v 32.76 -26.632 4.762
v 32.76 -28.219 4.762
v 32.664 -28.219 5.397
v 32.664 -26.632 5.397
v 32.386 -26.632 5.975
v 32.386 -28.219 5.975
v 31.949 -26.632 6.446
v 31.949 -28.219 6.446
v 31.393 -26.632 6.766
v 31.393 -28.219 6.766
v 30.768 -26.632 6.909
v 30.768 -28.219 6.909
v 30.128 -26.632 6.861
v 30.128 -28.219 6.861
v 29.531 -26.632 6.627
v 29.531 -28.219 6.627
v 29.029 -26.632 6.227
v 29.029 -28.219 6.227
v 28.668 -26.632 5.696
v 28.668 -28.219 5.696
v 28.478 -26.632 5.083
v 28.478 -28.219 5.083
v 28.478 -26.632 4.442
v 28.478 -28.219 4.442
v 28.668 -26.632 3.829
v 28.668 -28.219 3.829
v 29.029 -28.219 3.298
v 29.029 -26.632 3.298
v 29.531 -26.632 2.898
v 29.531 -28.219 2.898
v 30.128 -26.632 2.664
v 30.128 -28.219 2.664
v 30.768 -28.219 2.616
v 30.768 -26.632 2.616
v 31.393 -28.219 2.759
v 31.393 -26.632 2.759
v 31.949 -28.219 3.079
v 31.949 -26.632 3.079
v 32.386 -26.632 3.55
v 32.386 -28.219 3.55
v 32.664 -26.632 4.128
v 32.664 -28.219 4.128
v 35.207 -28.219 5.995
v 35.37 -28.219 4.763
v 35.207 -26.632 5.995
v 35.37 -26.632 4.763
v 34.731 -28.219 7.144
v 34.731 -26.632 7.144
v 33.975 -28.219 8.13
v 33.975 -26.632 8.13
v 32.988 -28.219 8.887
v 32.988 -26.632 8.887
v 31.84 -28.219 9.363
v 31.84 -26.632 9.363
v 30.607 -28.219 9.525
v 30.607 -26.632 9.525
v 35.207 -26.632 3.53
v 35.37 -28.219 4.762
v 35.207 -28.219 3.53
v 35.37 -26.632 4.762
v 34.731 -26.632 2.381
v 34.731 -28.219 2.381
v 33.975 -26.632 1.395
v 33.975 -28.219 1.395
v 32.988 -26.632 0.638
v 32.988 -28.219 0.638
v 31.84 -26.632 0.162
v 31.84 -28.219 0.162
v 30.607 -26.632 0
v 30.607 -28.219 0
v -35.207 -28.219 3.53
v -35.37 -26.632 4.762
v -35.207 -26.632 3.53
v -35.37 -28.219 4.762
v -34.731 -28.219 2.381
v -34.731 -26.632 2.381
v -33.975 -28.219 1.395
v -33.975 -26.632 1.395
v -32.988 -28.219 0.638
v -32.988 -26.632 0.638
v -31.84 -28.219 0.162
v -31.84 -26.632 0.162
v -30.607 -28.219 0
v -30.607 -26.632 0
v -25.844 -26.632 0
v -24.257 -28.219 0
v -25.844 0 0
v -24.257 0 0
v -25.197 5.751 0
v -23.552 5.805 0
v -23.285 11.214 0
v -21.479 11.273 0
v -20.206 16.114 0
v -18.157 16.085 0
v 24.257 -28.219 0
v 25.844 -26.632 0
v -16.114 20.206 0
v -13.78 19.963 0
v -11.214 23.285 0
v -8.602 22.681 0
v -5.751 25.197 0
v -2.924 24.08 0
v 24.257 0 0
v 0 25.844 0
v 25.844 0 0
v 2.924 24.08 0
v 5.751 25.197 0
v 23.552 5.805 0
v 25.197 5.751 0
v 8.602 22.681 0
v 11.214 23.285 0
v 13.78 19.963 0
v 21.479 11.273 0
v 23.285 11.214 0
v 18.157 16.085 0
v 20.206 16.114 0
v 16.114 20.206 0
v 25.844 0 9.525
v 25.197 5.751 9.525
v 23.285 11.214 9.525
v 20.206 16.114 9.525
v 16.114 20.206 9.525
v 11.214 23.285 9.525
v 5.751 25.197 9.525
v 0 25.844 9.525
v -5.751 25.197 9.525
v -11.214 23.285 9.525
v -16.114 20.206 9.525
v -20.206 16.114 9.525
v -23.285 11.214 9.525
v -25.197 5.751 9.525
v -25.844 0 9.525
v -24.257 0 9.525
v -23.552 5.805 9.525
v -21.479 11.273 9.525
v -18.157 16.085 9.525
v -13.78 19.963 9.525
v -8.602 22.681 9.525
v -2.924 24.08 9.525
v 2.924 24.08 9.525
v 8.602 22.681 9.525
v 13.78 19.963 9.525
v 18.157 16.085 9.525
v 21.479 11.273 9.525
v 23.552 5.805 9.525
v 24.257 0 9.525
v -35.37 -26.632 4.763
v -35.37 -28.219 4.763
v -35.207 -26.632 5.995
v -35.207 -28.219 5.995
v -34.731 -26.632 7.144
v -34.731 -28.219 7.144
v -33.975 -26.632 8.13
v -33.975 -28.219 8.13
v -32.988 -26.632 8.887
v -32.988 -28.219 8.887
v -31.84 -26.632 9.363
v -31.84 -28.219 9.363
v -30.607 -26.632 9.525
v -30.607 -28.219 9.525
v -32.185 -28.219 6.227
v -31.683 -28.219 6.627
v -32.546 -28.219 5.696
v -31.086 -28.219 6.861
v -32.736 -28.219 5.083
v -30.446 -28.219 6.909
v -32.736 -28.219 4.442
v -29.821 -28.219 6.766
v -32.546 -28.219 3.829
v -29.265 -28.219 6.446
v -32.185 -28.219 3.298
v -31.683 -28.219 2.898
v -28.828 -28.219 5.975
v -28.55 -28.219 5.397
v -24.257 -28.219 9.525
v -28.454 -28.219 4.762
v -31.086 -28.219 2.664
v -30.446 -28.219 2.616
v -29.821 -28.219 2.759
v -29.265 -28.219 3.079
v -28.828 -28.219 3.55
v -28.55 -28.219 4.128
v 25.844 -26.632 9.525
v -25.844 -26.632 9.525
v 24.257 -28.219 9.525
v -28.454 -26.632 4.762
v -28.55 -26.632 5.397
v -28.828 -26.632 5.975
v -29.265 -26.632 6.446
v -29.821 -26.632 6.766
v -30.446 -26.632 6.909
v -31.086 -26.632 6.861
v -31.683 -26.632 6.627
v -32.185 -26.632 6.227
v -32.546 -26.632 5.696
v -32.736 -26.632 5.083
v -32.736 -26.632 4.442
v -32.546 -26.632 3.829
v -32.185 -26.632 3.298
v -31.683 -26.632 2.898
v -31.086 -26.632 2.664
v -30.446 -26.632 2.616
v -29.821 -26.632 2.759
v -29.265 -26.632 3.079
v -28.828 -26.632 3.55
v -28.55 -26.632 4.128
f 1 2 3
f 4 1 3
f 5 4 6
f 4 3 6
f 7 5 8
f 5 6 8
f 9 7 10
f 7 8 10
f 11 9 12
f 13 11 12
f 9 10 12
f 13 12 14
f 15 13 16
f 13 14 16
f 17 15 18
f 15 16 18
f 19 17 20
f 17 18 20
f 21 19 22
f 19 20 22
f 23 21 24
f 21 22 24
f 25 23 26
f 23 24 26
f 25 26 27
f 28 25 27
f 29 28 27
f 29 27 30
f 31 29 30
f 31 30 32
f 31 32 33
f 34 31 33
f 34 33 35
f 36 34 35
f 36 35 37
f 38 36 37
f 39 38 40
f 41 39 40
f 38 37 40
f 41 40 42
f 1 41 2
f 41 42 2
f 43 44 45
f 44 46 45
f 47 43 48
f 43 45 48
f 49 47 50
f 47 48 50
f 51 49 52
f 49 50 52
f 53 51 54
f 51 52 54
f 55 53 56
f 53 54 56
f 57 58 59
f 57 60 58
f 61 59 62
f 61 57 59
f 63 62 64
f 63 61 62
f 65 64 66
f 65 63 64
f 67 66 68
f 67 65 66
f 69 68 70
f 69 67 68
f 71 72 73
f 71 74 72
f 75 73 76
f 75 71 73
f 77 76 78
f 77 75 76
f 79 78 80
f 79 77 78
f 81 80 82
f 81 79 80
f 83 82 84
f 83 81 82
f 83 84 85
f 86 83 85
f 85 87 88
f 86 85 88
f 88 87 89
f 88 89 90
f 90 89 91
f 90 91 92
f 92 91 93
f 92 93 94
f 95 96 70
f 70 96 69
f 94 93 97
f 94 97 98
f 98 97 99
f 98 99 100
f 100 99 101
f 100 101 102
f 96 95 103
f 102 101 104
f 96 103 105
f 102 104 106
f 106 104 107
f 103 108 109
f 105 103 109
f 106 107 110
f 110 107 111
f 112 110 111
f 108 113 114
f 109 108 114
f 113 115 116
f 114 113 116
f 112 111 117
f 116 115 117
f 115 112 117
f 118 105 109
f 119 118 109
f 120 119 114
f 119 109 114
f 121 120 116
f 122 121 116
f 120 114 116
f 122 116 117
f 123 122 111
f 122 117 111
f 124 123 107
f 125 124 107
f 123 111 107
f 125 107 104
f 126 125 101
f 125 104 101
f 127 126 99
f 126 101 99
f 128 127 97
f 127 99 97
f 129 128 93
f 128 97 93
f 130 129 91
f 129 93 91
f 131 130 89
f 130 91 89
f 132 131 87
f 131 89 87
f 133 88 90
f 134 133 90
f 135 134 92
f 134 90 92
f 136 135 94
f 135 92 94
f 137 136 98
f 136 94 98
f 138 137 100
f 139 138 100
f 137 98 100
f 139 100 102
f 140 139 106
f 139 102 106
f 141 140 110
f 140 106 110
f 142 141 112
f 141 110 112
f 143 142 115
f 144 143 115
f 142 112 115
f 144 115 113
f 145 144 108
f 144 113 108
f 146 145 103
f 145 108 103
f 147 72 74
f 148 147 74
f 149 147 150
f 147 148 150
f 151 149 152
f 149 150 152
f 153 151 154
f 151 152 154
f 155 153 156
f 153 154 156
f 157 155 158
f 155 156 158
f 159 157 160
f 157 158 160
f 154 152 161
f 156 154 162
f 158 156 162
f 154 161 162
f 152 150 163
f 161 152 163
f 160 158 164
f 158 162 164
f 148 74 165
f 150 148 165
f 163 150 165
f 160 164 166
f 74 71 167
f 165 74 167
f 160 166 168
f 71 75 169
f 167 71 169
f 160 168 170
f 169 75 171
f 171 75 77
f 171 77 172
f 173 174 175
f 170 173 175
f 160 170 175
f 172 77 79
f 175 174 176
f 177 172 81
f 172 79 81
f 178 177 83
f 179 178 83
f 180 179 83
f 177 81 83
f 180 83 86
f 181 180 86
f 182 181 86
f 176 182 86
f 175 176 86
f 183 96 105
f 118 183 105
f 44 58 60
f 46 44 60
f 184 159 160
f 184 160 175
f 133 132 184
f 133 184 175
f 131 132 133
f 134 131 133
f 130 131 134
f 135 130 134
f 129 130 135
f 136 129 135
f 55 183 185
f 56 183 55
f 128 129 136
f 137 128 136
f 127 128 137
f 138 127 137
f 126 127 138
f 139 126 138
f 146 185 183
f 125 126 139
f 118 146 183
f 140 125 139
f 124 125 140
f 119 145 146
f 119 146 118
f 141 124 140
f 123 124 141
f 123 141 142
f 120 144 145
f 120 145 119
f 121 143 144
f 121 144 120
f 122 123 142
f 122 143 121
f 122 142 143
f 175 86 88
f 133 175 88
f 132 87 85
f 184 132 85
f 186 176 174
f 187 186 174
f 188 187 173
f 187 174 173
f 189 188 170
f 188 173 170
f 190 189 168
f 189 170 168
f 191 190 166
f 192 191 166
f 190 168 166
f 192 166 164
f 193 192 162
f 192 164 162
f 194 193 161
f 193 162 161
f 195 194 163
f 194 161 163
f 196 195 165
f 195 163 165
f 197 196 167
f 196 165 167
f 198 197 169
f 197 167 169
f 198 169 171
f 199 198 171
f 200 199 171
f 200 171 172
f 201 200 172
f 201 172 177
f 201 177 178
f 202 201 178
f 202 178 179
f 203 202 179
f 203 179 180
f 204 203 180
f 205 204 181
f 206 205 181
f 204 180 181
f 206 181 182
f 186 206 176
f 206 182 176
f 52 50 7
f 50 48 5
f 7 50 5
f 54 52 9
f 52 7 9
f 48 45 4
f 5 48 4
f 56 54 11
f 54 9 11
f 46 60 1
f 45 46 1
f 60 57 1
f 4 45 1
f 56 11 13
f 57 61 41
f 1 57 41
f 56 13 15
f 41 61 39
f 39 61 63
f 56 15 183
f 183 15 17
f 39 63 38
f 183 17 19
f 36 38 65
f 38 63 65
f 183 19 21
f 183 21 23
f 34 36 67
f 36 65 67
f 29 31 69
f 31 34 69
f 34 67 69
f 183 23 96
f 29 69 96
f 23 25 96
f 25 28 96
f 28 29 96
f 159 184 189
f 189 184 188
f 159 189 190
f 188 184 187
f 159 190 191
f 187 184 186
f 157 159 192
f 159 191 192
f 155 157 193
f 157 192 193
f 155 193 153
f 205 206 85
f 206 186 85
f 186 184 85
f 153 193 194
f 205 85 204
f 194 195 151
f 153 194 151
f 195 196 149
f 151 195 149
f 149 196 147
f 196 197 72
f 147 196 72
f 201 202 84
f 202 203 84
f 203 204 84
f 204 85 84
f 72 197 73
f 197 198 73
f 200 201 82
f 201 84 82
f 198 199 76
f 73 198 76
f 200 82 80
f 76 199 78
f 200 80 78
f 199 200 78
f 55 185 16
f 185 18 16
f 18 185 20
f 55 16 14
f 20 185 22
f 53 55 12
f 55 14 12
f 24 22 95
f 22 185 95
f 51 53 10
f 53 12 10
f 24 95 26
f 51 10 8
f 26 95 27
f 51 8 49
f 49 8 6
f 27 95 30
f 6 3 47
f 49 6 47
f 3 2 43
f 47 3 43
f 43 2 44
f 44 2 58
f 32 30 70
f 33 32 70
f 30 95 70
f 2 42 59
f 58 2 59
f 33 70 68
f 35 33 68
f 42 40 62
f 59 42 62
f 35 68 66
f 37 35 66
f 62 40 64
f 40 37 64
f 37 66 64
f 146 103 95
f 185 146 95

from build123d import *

# Parameters (mm, degrees)
F1_DEPTH = 9.525
F2_R     = 4.76249
F3_R     = 2.15265
F4_DEPTH = 1.5875


# Not quite as in the source:
# - a fillet or chamfer is up to 0.001 mm smaller than in the source, because OpenCascade refuses the exact size


with BuildPart() as f1:
    # F0 (on Top) → F1 (new body)
    with BuildSketch(Plane.XY):
        with BuildLine():
            Line((-24.257, -28.2194), (-24.257, 0))
            ThreePointArc((-24.257, 0), (0, 24.257), (24.257, 0))
            Line((24.257, 0), (24.257, -28.2194))
            Line((24.257, -28.2194), (35.3695, -28.2194))
            Line((35.3695, -28.2194), (35.3695, -26.6319))
            Line((35.3695, -26.6319), (25.8445, -26.6319))
            Line((25.8445, -26.6319), (25.8445, 0))
            ThreePointArc((25.8445, 0), (0, 25.8445), (-25.8445, 0))
            Line((-25.8445, 0), (-25.8445, -26.6319))
            Line((-25.8445, -26.6319), (-35.3695, -26.6319))
            Line((-35.3695, -26.6319), (-35.3695, -28.2194))
            Line((-35.3695, -28.2194), (-24.257, -28.2194))
        make_face()
    extrude(amount=F1_DEPTH)

    # F2 (radius 4.7625 in the source; OpenCascade refuses exactly that, so slightly less here)
    f2_edges = [f1.edges().sort_by_distance(p)[0] for p in [
        (35.3695, -27.42565, 9.525),
        (35.3695, -27.42565, 0),
        (-35.3695, -27.42565, 0),
        (-35.3695, -27.42565, 9.525),
    ]]
    fillet(f2_edges, radius=F2_R)

    # F3 (on face) → F4 (cut, through all)
    with BuildSketch(Plane.XZ.offset(28.2194)):
        with Locations((30.607, 4.7625)):
            Circle(F3_R)
        with Locations((-30.607, 4.7625)):
            Circle(F3_R)
    extrude(amount=-F4_DEPTH, mode=Mode.SUBTRACT)


solid = f1.part
